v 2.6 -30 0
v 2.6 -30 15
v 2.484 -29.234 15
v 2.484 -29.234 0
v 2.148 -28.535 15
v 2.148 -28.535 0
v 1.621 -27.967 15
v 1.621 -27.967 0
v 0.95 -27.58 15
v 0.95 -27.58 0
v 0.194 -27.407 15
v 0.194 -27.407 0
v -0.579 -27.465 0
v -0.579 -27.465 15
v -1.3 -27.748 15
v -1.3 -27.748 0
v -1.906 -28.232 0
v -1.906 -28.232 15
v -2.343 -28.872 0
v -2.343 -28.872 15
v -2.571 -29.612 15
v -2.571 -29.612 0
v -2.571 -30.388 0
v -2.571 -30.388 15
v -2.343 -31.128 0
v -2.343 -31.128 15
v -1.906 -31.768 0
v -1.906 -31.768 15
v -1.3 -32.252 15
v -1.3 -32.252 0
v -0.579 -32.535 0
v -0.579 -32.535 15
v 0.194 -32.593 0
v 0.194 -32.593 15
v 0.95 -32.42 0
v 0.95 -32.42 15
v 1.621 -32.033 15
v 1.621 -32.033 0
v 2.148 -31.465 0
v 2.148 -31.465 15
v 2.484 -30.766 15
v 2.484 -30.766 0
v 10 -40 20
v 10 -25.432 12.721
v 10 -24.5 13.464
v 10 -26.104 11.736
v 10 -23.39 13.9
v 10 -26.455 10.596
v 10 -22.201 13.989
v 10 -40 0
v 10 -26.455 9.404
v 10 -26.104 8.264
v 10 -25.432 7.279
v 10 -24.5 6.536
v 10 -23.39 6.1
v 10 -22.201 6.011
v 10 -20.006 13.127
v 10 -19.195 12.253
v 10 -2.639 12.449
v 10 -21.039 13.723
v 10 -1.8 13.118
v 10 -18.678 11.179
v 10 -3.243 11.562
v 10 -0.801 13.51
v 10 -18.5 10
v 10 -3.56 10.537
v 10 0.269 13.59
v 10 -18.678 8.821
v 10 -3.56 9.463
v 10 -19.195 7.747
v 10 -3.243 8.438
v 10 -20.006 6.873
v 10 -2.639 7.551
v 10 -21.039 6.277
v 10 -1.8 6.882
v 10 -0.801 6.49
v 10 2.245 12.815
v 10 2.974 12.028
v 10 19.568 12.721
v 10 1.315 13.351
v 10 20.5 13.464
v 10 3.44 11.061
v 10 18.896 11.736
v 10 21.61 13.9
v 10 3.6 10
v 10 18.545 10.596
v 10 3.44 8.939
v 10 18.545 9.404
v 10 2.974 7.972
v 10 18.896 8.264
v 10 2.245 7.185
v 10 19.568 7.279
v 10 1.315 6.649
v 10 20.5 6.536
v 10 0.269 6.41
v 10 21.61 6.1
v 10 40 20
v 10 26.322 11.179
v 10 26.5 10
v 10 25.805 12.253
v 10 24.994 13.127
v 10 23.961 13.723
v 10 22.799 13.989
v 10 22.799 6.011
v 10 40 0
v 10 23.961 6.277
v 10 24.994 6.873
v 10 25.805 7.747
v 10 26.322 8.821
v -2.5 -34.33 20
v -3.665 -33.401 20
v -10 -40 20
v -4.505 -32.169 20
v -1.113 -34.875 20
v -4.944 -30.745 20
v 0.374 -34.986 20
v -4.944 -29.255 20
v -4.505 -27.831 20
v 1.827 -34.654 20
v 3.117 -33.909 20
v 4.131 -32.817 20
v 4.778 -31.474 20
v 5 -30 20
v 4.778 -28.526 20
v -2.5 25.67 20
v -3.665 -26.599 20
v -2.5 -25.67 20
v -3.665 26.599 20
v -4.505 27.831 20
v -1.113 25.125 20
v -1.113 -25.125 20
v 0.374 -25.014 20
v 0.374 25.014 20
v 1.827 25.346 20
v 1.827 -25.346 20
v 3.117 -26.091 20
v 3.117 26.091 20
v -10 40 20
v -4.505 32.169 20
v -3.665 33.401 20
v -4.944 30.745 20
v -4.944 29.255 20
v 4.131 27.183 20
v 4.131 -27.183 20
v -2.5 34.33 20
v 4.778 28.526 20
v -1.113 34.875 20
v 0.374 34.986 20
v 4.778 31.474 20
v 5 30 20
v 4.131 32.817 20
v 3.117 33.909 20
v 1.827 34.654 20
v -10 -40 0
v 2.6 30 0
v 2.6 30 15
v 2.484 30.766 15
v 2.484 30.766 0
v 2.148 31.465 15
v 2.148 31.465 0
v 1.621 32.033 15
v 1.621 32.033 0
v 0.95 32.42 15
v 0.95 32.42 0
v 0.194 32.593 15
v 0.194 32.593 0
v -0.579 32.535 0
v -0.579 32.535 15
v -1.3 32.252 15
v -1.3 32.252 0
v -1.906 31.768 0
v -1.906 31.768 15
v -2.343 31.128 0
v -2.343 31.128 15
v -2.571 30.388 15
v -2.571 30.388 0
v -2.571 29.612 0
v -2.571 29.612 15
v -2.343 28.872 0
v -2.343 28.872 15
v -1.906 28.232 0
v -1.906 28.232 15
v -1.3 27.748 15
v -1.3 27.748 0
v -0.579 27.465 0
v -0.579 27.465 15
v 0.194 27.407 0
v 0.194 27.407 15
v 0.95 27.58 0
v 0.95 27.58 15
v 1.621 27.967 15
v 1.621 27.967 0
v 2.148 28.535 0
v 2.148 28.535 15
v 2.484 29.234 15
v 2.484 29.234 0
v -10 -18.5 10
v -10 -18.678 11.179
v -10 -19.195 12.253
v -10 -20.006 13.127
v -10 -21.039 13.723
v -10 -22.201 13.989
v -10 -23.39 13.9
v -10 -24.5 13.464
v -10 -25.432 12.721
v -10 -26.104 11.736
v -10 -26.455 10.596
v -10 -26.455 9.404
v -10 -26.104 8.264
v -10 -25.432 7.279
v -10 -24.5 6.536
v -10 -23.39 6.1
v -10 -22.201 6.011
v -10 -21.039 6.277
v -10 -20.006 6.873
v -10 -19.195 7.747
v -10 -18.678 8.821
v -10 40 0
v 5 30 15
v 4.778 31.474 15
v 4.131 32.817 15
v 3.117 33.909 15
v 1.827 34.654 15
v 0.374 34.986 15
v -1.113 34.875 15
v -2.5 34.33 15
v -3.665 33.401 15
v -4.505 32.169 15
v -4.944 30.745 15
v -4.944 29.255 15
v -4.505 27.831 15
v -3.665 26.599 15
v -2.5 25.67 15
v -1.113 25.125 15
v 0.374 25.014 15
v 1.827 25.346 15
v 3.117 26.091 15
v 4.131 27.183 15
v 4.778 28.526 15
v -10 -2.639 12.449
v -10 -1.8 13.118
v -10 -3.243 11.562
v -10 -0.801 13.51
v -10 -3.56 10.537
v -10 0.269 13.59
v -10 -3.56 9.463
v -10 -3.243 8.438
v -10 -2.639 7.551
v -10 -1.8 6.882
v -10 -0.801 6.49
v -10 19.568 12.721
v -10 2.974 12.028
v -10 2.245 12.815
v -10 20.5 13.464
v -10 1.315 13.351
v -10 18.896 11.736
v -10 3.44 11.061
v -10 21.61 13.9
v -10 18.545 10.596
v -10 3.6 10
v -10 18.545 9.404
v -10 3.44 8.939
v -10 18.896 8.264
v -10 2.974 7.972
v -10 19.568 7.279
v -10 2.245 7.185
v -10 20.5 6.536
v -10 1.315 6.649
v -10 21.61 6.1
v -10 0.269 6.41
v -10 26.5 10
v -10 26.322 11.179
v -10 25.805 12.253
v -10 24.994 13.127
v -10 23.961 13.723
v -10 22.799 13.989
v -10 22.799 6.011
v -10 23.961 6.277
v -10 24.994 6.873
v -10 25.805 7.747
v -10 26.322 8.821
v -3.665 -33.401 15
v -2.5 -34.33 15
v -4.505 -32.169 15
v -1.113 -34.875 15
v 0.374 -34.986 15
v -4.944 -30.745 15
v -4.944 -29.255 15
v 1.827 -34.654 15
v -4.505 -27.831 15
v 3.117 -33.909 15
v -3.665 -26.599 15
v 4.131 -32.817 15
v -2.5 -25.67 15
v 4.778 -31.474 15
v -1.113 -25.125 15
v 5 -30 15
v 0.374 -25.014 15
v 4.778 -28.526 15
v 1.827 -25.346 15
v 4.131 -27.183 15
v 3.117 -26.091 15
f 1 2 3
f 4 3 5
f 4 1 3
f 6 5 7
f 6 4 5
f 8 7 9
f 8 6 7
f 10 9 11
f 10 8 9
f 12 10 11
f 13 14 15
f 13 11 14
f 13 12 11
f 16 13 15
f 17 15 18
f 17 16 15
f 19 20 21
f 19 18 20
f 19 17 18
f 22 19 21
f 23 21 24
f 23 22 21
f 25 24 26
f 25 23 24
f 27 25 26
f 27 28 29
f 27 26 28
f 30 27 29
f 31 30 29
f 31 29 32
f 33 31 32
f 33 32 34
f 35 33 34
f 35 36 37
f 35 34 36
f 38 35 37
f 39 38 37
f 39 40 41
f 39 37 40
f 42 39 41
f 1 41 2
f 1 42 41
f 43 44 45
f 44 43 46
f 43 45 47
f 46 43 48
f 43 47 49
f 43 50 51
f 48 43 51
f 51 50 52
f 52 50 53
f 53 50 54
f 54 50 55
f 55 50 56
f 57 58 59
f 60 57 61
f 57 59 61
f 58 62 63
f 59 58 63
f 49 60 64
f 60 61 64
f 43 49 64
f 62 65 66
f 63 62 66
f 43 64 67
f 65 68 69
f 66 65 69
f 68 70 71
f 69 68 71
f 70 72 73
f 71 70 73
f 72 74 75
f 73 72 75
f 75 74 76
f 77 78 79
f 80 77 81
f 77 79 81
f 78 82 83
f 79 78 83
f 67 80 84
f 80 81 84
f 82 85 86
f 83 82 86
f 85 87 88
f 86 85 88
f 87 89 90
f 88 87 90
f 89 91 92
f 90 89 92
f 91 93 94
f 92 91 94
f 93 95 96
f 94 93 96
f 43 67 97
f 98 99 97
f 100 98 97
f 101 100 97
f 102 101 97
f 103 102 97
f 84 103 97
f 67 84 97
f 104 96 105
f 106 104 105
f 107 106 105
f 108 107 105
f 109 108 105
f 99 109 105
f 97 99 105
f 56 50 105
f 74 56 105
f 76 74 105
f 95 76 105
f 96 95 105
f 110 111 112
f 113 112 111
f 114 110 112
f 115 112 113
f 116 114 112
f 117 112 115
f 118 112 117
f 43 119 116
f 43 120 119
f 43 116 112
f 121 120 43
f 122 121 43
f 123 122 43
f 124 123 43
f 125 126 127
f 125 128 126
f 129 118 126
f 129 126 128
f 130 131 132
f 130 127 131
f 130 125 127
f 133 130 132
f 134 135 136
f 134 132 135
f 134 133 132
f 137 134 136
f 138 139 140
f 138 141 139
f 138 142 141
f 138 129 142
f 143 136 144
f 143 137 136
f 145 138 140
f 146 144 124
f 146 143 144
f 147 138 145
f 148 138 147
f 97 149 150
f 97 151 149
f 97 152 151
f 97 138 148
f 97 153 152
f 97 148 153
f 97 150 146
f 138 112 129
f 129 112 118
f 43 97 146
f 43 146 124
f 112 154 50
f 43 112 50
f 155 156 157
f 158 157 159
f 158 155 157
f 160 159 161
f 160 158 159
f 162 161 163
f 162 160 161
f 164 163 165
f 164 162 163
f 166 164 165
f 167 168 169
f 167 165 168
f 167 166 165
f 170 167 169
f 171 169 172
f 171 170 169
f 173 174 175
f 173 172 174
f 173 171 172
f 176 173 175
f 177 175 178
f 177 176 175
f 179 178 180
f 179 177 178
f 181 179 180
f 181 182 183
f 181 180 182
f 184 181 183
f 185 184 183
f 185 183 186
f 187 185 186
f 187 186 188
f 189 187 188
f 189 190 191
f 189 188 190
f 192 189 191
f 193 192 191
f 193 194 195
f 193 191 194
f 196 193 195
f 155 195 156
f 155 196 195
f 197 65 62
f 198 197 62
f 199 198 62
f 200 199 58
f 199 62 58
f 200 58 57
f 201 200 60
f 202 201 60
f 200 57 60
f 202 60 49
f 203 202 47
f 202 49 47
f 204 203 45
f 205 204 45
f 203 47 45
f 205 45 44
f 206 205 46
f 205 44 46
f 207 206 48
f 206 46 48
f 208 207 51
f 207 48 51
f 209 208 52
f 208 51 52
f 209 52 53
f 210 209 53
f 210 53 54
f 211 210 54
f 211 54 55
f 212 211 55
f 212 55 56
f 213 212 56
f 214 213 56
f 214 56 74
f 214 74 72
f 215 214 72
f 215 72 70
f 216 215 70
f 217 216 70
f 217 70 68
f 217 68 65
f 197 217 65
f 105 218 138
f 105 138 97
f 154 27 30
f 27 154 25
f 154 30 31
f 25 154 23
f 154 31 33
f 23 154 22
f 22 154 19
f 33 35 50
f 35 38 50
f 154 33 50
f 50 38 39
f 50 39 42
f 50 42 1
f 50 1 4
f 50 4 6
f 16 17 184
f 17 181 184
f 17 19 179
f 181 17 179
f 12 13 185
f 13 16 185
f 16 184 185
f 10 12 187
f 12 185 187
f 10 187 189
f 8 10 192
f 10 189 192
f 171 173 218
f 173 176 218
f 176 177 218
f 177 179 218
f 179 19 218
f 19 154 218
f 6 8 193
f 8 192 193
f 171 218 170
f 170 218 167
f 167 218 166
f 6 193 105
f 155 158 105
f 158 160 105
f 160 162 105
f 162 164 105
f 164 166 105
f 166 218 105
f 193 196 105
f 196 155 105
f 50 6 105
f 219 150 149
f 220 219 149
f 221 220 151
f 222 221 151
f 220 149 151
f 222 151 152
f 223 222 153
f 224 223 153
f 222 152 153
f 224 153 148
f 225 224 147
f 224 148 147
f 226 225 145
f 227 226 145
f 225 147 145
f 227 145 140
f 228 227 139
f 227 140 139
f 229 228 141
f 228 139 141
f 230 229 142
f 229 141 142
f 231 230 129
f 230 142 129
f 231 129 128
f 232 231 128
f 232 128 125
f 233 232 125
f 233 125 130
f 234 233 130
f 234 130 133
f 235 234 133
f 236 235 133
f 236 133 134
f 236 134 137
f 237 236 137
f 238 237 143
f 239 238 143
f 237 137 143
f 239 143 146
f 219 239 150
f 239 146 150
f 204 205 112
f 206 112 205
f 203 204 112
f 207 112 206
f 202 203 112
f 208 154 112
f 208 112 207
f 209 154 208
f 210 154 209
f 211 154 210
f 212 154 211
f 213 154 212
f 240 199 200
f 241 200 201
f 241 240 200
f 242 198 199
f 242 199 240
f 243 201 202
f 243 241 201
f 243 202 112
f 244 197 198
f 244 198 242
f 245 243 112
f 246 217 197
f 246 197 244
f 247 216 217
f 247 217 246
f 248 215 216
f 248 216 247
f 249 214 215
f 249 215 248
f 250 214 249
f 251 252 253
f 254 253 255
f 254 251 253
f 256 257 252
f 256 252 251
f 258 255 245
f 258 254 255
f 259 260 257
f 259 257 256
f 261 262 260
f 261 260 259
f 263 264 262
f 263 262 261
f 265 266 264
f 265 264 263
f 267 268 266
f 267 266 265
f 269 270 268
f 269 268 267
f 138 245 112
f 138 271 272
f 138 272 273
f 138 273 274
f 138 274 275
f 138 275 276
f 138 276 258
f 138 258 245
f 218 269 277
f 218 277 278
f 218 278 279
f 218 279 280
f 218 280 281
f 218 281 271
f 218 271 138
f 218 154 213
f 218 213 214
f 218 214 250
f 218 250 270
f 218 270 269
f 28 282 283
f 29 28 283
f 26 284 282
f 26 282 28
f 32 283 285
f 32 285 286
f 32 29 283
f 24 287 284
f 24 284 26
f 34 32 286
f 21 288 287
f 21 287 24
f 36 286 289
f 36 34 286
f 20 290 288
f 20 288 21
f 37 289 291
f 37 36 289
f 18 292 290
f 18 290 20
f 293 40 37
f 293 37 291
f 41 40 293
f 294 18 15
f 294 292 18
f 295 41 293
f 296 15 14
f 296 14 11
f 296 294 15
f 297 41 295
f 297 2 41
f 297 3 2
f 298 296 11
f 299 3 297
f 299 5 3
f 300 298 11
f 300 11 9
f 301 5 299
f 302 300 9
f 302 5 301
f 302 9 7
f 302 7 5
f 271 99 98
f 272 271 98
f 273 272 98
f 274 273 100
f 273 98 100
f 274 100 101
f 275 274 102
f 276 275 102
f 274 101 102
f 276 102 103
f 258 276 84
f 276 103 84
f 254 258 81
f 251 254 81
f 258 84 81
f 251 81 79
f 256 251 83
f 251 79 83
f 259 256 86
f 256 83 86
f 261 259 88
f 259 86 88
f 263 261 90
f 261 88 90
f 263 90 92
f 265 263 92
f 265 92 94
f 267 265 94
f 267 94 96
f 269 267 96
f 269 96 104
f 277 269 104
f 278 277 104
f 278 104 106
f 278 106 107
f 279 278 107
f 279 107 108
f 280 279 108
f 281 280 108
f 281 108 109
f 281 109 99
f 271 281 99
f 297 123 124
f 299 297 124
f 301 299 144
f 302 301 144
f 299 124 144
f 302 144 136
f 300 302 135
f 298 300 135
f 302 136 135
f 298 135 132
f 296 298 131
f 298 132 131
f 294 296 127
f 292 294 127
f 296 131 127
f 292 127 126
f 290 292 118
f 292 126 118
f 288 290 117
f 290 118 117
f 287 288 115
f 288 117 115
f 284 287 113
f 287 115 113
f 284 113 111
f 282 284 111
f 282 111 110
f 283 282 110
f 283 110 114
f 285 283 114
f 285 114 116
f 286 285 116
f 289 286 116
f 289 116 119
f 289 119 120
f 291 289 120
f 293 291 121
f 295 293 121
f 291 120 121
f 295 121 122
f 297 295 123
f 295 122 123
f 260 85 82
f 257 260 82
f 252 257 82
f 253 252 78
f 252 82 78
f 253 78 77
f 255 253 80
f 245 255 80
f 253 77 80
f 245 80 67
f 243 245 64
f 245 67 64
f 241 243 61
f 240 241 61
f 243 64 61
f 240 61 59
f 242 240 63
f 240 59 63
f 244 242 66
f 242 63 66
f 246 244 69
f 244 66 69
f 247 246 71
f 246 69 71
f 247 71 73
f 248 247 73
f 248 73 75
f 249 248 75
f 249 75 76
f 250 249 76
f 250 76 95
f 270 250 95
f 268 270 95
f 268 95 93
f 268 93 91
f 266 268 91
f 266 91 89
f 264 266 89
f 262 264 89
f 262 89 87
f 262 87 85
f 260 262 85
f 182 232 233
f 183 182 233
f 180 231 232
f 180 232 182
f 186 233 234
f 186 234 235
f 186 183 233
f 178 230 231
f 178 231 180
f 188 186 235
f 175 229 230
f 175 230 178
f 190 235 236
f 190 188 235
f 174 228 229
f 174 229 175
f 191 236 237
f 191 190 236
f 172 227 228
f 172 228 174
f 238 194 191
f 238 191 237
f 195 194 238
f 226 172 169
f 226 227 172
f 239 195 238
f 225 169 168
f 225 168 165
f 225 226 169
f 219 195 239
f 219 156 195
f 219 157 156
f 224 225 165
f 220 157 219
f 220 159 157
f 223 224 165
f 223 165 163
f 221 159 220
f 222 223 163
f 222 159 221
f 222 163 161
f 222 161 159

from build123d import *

# Parameters (mm, degrees)
F0_W     = 20
F0_H     = 80
F0_R     = 2.6
F1_DEPTH = 20
F2_R     = 5
F3_DEPTH = 5
F4_R     = 4
F4_R_2   = 3.6
F5_DEPTH = 25


with BuildPart() as f1:
    # F0 (on Top) → F1 (new body)
    with BuildSketch(Plane.XY):
        Rectangle(F0_W, F0_H)
        with Locations((0, -30)):
            Circle(F0_R, mode=Mode.SUBTRACT)
        with Locations((0, 30)):
            Circle(F0_R, mode=Mode.SUBTRACT)
    extrude(amount=F1_DEPTH)

    # F2 (on face) → F3 (cut)
    with BuildSketch(Plane.XY.offset(20)):
        with Locations((0, 30)):
            Circle(F2_R)
        with Locations((0, -30)):
            Circle(F2_R)
    extrude(amount=-F3_DEPTH, mode=Mode.SUBTRACT)

    # F4 (on face) → F5 (cut)
    with BuildSketch(Plane.YZ.offset(10)):
        with Locations((-22.5, 10)):
            Circle(F4_R)
        with Locations((22.5, 10)):
            Circle(F4_R)
        with Locations((0, 10)):
            Circle(F4_R_2)
    extrude(amount=-F5_DEPTH, mode=Mode.SUBTRACT)


solid = f1.part
